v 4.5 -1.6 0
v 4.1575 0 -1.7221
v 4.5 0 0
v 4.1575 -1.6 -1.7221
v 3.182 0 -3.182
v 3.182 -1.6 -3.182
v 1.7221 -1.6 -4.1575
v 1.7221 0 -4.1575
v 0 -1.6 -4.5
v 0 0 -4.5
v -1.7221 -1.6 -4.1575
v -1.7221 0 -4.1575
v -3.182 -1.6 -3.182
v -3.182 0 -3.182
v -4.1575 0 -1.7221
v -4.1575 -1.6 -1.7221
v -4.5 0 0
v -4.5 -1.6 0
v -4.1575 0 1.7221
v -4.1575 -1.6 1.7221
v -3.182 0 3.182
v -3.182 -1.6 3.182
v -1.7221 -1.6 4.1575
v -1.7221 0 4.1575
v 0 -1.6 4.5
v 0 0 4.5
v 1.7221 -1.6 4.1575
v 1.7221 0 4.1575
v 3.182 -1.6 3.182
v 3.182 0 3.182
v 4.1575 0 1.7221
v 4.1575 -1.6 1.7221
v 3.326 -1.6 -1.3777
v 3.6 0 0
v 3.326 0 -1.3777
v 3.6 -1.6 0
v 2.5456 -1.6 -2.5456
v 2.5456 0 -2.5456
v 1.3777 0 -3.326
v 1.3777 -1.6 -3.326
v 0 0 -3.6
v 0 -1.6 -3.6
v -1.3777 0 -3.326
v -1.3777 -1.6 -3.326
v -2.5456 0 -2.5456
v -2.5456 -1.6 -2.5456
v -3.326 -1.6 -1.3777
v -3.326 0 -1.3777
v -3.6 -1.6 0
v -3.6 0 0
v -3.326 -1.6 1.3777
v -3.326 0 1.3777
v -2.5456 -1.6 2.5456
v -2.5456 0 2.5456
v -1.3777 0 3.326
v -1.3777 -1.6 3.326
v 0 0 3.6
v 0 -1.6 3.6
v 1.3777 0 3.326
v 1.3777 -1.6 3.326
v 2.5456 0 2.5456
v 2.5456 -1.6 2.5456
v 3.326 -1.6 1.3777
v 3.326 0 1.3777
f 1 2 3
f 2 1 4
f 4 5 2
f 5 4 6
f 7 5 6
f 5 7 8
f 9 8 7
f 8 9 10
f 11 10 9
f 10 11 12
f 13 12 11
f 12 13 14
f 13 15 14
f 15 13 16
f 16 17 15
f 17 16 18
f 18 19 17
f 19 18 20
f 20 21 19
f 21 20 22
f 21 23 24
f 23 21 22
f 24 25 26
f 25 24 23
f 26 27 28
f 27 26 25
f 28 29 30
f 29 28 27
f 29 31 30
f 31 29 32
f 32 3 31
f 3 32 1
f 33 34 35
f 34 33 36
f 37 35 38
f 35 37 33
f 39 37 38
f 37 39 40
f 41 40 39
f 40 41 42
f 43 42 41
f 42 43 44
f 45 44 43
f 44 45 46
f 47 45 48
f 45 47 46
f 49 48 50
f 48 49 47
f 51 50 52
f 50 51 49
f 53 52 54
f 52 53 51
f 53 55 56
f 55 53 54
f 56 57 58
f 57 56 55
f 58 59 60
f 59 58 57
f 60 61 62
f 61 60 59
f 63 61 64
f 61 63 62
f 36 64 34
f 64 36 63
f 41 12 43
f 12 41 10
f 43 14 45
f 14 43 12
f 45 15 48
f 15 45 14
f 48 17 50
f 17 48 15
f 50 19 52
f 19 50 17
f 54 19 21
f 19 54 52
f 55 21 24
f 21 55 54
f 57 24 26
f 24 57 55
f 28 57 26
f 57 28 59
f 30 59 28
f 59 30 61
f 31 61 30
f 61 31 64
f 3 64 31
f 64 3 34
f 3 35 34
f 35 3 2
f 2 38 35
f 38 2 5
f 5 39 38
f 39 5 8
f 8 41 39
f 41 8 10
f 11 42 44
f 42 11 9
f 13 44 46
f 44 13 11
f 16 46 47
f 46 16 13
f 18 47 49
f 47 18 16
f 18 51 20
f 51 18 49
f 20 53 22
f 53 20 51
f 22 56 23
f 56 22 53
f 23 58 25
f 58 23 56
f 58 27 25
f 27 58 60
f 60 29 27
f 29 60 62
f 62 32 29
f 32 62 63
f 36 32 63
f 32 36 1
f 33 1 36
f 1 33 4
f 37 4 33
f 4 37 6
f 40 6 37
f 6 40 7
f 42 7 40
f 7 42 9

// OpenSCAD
// file: ../p/4-4edge.scad
use <../lib.scad>
function ldraw_lib__4_4edge() = [
// 0 Circle 1.0
// 0 Name: 4-4edge.dat
// 0 Author: James Jessiman
// 0 !LDRAW_ORG Primitive UPDATE 2017-01
// 0 !LICENSE Licensed under CC BY 4.0 : see CAreadme.txt
// 
// 0 BFC CERTIFY CCW
  [0,"BFC","CERTIFY"],
  [0,"BFC","CCW"],
// 
// 0 !HISTORY 1998-12-15 [PTadmin] Official Update 1998-10
// 0 !HISTORY 2005-12-28 [PTadmin] Official Update 2005-01
// 0 !HISTORY 2007-06-24 [PTadmin] Header formatted for Contributor Agreement
// 0 !HISTORY 2008-07-01 [PTadmin] Official Update 2008-01
// 0 !HISTORY 2017-01-15 [Steffen] BFCed
// 0 !HISTORY 2017-12-30 [PTadmin] Official Update 2017-01
// 
// 
// 2 24 1 0 0 0.9239 0 0.3827
  [2,24,1,0,0,0.9239,0,0.3827],
// 2 24 0.9239 0 0.3827 0.7071 0 0.7071
  [2,24,0.9239,0,0.3827,0.7071,0,0.7071],
// 2 24 0.7071 0 0.7071 0.3827 0 0.9239
  [2,24,0.7071,0,0.7071,0.3827,0,0.9239],
// 2 24 0.3827 0 0.9239 0 0 1
  [2,24,0.3827,0,0.9239,0,0,1],
// 2 24 0 0 1 -0.3827 0 0.9239
  [2,24,0,0,1,-0.3827,0,0.9239],
// 2 24 -0.3827 0 0.9239 -0.7071 0 0.7071
  [2,24,-0.3827,0,0.9239,-0.7071,0,0.7071],
// 2 24 -0.7071 0 0.7071 -0.9239 0 0.3827
  [2,24,-0.7071,0,0.7071,-0.9239,0,0.3827],
// 2 24 -0.9239 0 0.3827 -1 0 -0
  [2,24,-0.9239,0,0.3827,-1,0,-0],
// 2 24 -1 0 -0 -0.9239 0 -0.3827
  [2,24,-1,0,-0,-0.9239,0,-0.3827],
// 2 24 -0.9239 0 -0.3827 -0.7071 0 -0.7071
  [2,24,-0.9239,0,-0.3827,-0.7071,0,-0.7071],
// 2 24 -0.7071 0 -0.7071 -0.3827 0 -0.9239
  [2,24,-0.7071,0,-0.7071,-0.3827,0,-0.9239],
// 2 24 -0.3827 0 -0.9239 0 0 -1
  [2,24,-0.3827,0,-0.9239,0,0,-1],
// 2 24 0 0 -1 0.3827 0 -0.9239
  [2,24,0,0,-1,0.3827,0,-0.9239],
// 2 24 0.3827 0 -0.9239 0.7071 0 -0.7071
  [2,24,0.3827,0,-0.9239,0.7071,0,-0.7071],
// 2 24 0.7071 0 -0.7071 0.9239 0 -0.3827
  [2,24,0.7071,0,-0.7071,0.9239,0,-0.3827],
// 2 24 0.9239 0 -0.3827 1 0 0
  [2,24,0.9239,0,-0.3827,1,0,0],
];
module ldraw_lib__4_4edge(step=0, col=false, unit=2/5, alt=false, line=0.2, solid=!$preview)
    makepoly(ldraw_lib__4_4edge(), step=step, col=col, unit=unit, alt=alt, line=line, solid=solid);
ldraw_lib__4_4edge(line=0.2);
// file: ../p/4-4cyli.scad
use <../lib.scad>
function ldraw_lib__4_4cyli() = [
// 0 Cylinder 1.0
// 0 Name: 4-4cyli.dat
// 0 Author: James Jessiman
// 0 !LDRAW_ORG Primitive UPDATE 2005-01
// 0 !LICENSE Licensed under CC BY 4.0 : see CAreadme.txt
// 
// 0 BFC CERTIFY CCW
  [0,"BFC","CERTIFY"],
  [0,"BFC","CCW"],
// 
// 0 !HISTORY 1998-12-15 [PTadmin] Official Update 1998-10
// 0 !HISTORY 2002-03-23 [sbliss] Added BFC statement; merged headers from files in distributions LDraw 0.27 and Complete.
// 0 !HISTORY 2002-04-25 [PTadmin] Official Update 2002-02
// 0 !HISTORY 2004-12-14 [guyvivan] BFC CCW
// 0 !HISTORY 2005-12-28 [PTadmin] Official Update 2005-01
// 0 !HISTORY 2007-06-24 [PTadmin] Header formatted for Contributor Agreement
// 0 !HISTORY 2008-07-01 [PTadmin] Official Update 2008-01
// 
// 
// 4 16 1 1 0 0.9239 1 0.3827 0.9239 0 0.3827 1 0 0
  [4,16,1,1,0,0.9239,1,0.3827,0.9239,0,0.3827,1,0,0],
// 5 24 1 0 0 1 1 0 0.9239 0 0.3827 0.9239 0 -0.3827
  [5,24,1,0,0,1,1,0,0.9239,0,0.3827,0.9239,0,-0.3827],
// 4 16 0.9239 1 0.3827 0.7071 1 0.7071 0.7071 0 0.7071 0.9239 0 0.3827
  [4,16,0.9239,1,0.3827,0.7071,1,0.7071,0.7071,0,0.7071,0.9239,0,0.3827],
// 5 24 0.9239 0 0.3827 0.9239 1 0.3827 0.7071 0 0.7071 1 0 0
  [5,24,0.9239,0,0.3827,0.9239,1,0.3827,0.7071,0,0.7071,1,0,0],
// 4 16 0.7071 1 0.7071 0.3827 1 0.9239 0.3827 0 0.9239 0.7071 0 0.7071
  [4,16,0.7071,1,0.7071,0.3827,1,0.9239,0.3827,0,0.9239,0.7071,0,0.7071],
// 5 24 0.7071 0 0.7071 0.7071 1 0.7071 0.3827 0 0.9239 0.9239 0 0.3827
  [5,24,0.7071,0,0.7071,0.7071,1,0.7071,0.3827,0,0.9239,0.9239,0,0.3827],
// 4 16 0.3827 1 0.9239 0 1 1 0 0 1 0.3827 0 0.9239
  [4,16,0.3827,1,0.9239,0,1,1,0,0,1,0.3827,0,0.9239],
// 5 24 0.3827 0 0.9239 0.3827 1 0.9239 0 0 1 0.7071 0 0.7071
  [5,24,0.3827,0,0.9239,0.3827,1,0.9239,0,0,1,0.7071,0,0.7071],
// 4 16 0 1 1 -0.3827 1 0.9239 -0.3827 0 0.9239 0 0 1
  [4,16,0,1,1,-0.3827,1,0.9239,-0.3827,0,0.9239,0,0,1],
// 5 24 0 0 1 0 1 1 -0.3827 0 0.9239 0.3827 0 0.9239
  [5,24,0,0,1,0,1,1,-0.3827,0,0.9239,0.3827,0,0.9239],
// 4 16 -0.3827 1 0.9239 -0.7071 1 0.7071 -0.7071 0 0.7071 -0.3827 0 0.9239
  [4,16,-0.3827,1,0.9239,-0.7071,1,0.7071,-0.7071,0,0.7071,-0.3827,0,0.9239],
// 5 24 -0.3827 0 0.9239 -0.3827 1 0.9239 -0.7071 0 0.7071 0 0 1
  [5,24,-0.3827,0,0.9239,-0.3827,1,0.9239,-0.7071,0,0.7071,0,0,1],
// 4 16 -0.7071 1 0.7071 -0.9239 1 0.3827 -0.9239 0 0.3827 -0.7071 0 0.7071
  [4,16,-0.7071,1,0.7071,-0.9239,1,0.3827,-0.9239,0,0.3827,-0.7071,0,0.7071],
// 5 24 -0.7071 0 0.7071 -0.7071 1 0.7071 -0.9239 0 0.3827 -0.3827 0 0.9239
  [5,24,-0.7071,0,0.7071,-0.7071,1,0.7071,-0.9239,0,0.3827,-0.3827,0,0.9239],
// 4 16 -0.9239 1 0.3827 -1 1 0 -1 0 0 -0.9239 0 0.3827
  [4,16,-0.9239,1,0.3827,-1,1,0,-1,0,0,-0.9239,0,0.3827],
// 5 24 -0.9239 0 0.3827 -0.9239 1 0.3827 -1 0 0 -0.7071 0 0.7071
  [5,24,-0.9239,0,0.3827,-0.9239,1,0.3827,-1,0,0,-0.7071,0,0.7071],
// 4 16 -1 1 0 -0.9239 1 -0.3827 -0.9239 0 -0.3827 -1 0 0
  [4,16,-1,1,0,-0.9239,1,-0.3827,-0.9239,0,-0.3827,-1,0,0],
// 5 24 -1 0 0 -1 1 0 -0.9239 0 -0.3827 -0.9239 0 0.3827
  [5,24,-1,0,0,-1,1,0,-0.9239,0,-0.3827,-0.9239,0,0.3827],
// 4 16 -0.9239 1 -0.3827 -0.7071 1 -0.7071 -0.7071 0 -0.7071 -0.9239 0 -0.3827
  [4,16,-0.9239,1,-0.3827,-0.7071,1,-0.7071,-0.7071,0,-0.7071,-0.9239,0,-0.3827],
// 5 24 -0.9239 0 -0.3827 -0.9239 1 -0.3827 -0.7071 0 -0.7071 -1 0 0
  [5,24,-0.9239,0,-0.3827,-0.9239,1,-0.3827,-0.7071,0,-0.7071,-1,0,0],
// 4 16 -0.7071 1 -0.7071 -0.3827 1 -0.9239 -0.3827 0 -0.9239 -0.7071 0 -0.7071
  [4,16,-0.7071,1,-0.7071,-0.3827,1,-0.9239,-0.3827,0,-0.9239,-0.7071,0,-0.7071],
// 5 24 -0.7071 0 -0.7071 -0.7071 1 -0.7071 -0.3827 0 -0.9239 -0.9239 0 -0.3827
  [5,24,-0.7071,0,-0.7071,-0.7071,1,-0.7071,-0.3827,0,-0.9239,-0.9239,0,-0.3827],
// 4 16 -0.3827 1 -0.9239 0 1 -1 0 0 -1 -0.3827 0 -0.9239
  [4,16,-0.3827,1,-0.9239,0,1,-1,0,0,-1,-0.3827,0,-0.9239],
// 5 24 -0.3827 0 -0.9239 -0.3827 1 -0.9239 0 0 -1 -0.7071 0 -0.7071
  [5,24,-0.3827,0,-0.9239,-0.3827,1,-0.9239,0,0,-1,-0.7071,0,-0.7071],
// 4 16 0 1 -1 0.3827 1 -0.9239 0.3827 0 -0.9239 0 0 -1
  [4,16,0,1,-1,0.3827,1,-0.9239,0.3827,0,-0.9239,0,0,-1],
// 5 24 0 0 -1 0 1 -1 0.3827 0 -0.9239 -0.3827 0 -0.9239
  [5,24,0,0,-1,0,1,-1,0.3827,0,-0.9239,-0.3827,0,-0.9239],
// 4 16 0.3827 1 -0.9239 0.7071 1 -0.7071 0.7071 0 -0.7071 0.3827 0 -0.9239
  [4,16,0.3827,1,-0.9239,0.7071,1,-0.7071,0.7071,0,-0.7071,0.3827,0,-0.9239],
// 5 24 0.3827 0 -0.9239 0.3827 1 -0.9239 0.7071 0 -0.7071 0 0 -1
  [5,24,0.3827,0,-0.9239,0.3827,1,-0.9239,0.7071,0,-0.7071,0,0,-1],
// 4 16 0.7071 1 -0.7071 0.9239 1 -0.3827 0.9239 0 -0.3827 0.7071 0 -0.7071
  [4,16,0.7071,1,-0.7071,0.9239,1,-0.3827,0.9239,0,-0.3827,0.7071,0,-0.7071],
// 5 24 0.7071 0 -0.7071 0.7071 1 -0.7071 0.9239 0 -0.3827 0.3827 0 -0.9239
  [5,24,0.7071,0,-0.7071,0.7071,1,-0.7071,0.9239,0,-0.3827,0.3827,0,-0.9239],
// 4 16 0.9239 1 -0.3827 1 1 0 1 0 0 0.9239 0 -0.3827
  [4,16,0.9239,1,-0.3827,1,1,0,1,0,0,0.9239,0,-0.3827],
// 5 24 0.9239 0 -0.3827 0.9239 1 -0.3827 1 0 0 0.7071 0 -0.7071
  [5,24,0.9239,0,-0.3827,0.9239,1,-0.3827,1,0,0,0.7071,0,-0.7071],
// 0
];
module ldraw_lib__4_4cyli(step=0, col=false, unit=2/5, alt=false, line=0.2, solid=!$preview)
    makepoly(ldraw_lib__4_4cyli(), step=step, col=col, unit=unit, alt=alt, line=line, solid=solid);
ldraw_lib__4_4cyli(line=0.2);
// file: ../p/4-4ring4.scad
use <../lib.scad>
function ldraw_lib__4_4ring4() = [
// 0 Ring  4 x 1.0
// 0 Name: 4-4ring4.dat
// 0 Author: James Jessiman
// 0 !LDRAW_ORG Primitive UPDATE 2009-01
// 0 !LICENSE Licensed under CC BY 4.0 : see CAreadme.txt
// 
// 0 BFC CERTIFY CCW
  [0,"BFC","CERTIFY"],
  [0,"BFC","CCW"],
// 
// 0 !HISTORY 1998-12-15 [PTadmin] Official Update 1998-10
// 0 !HISTORY 2002-04-08 [BrickCaster] Modified for BFC compliance
// 0 !HISTORY 2002-04-25 [PTadmin] Official Update 2002-02
// 0 !HISTORY 2007-06-24 [PTadmin] Header formatted for Contributor Agreement
// 0 !HISTORY 2008-07-01 [PTadmin] Official Update 2008-01
// 0 !HISTORY 2008-08-26 [cwdee] Switch polygon winding and rename
// 0 !HISTORY 2009-05-02 [PTadmin] Official Update 2009-01
// 
// 
// 4 16 -1.9135 0 4.6195 -1.5308 0 3.6956 0 0 4 0 0 5
  [4,16,-1.9135,0,4.6195,-1.5308,0,3.6956,0,0,4,0,0,5],
// 4 16 -3.5355 0 3.5355 -2.8284 0 2.8284 -1.5308 0 3.6956 -1.9135 0 4.6195
  [4,16,-3.5355,0,3.5355,-2.8284,0,2.8284,-1.5308,0,3.6956,-1.9135,0,4.6195],
// 4 16 -4.6195 0 1.9135 -3.6956 0 1.5308 -2.8284 0 2.8284 -3.5355 0 3.5355
  [4,16,-4.6195,0,1.9135,-3.6956,0,1.5308,-2.8284,0,2.8284,-3.5355,0,3.5355],
// 4 16 -5 0 0 -4 0 0 -3.6956 0 1.5308 -4.6195 0 1.9135
  [4,16,-5,0,0,-4,0,0,-3.6956,0,1.5308,-4.6195,0,1.9135],
// 4 16 -4.6195 0 -1.9135 -3.6956 0 -1.5308 -4 0 0 -5 0 0
  [4,16,-4.6195,0,-1.9135,-3.6956,0,-1.5308,-4,0,0,-5,0,0],
// 4 16 -3.5355 0 -3.5355 -2.8284 0 -2.8284 -3.6956 0 -1.5308 -4.6195 0 -1.9135
  [4,16,-3.5355,0,-3.5355,-2.8284,0,-2.8284,-3.6956,0,-1.5308,-4.6195,0,-1.9135],
// 4 16 -1.9135 0 -4.6195 -1.5308 0 -3.6956 -2.8284 0 -2.8284 -3.5355 0 -3.5355
  [4,16,-1.9135,0,-4.6195,-1.5308,0,-3.6956,-2.8284,0,-2.8284,-3.5355,0,-3.5355],
// 4 16 0 0 -5 0 0 -4 -1.5308 0 -3.6956 -1.9135 0 -4.6195
  [4,16,0,0,-5,0,0,-4,-1.5308,0,-3.6956,-1.9135,0,-4.6195],
// 4 16 1.9135 0 -4.6195 1.5308 0 -3.6956 0 0 -4 0 0 -5
  [4,16,1.9135,0,-4.6195,1.5308,0,-3.6956,0,0,-4,0,0,-5],
// 4 16 3.5355 0 -3.5355 2.8284 0 -2.8284 1.5308 0 -3.6956 1.9135 0 -4.6195
  [4,16,3.5355,0,-3.5355,2.8284,0,-2.8284,1.5308,0,-3.6956,1.9135,0,-4.6195],
// 4 16 4.6195 0 -1.9135 3.6956 0 -1.5308 2.8284 0 -2.8284 3.5355 0 -3.5355
  [4,16,4.6195,0,-1.9135,3.6956,0,-1.5308,2.8284,0,-2.8284,3.5355,0,-3.5355],
// 4 16 5 0 0 4 0 0 3.6956 0 -1.5308 4.6195 0 -1.9135
  [4,16,5,0,0,4,0,0,3.6956,0,-1.5308,4.6195,0,-1.9135],
// 4 16 4.6195 0 1.9135 3.6956 0 1.5308 4 0 0 5 0 0
  [4,16,4.6195,0,1.9135,3.6956,0,1.5308,4,0,0,5,0,0],
// 4 16 3.5355 0 3.5355 2.8284 0 2.8284 3.6956 0 1.5308 4.6195 0 1.9135
  [4,16,3.5355,0,3.5355,2.8284,0,2.8284,3.6956,0,1.5308,4.6195,0,1.9135],
// 4 16 1.9135 0 4.6195 1.5308 0 3.6956 2.8284 0 2.8284 3.5355 0 3.5355
  [4,16,1.9135,0,4.6195,1.5308,0,3.6956,2.8284,0,2.8284,3.5355,0,3.5355],
// 4 16 0 0 5 0 0 4 1.5308 0 3.6956 1.9135 0 4.6195
  [4,16,0,0,5,0,0,4,1.5308,0,3.6956,1.9135,0,4.6195],
// 0
];
module ldraw_lib__4_4ring4(step=0, col=false, unit=2/5, alt=false, line=0.2, solid=!$preview)
    makepoly(ldraw_lib__4_4ring4(), step=step, col=col, unit=unit, alt=alt, line=line, solid=solid);
ldraw_lib__4_4ring4(line=0.2);
// file: ../p/4-4cylo.scad
use <../lib.scad>
use <4-4cyli.scad>
use <4-4edge.scad>
function ldraw_lib__4_4cylo() = [
// 0 Cylinder Open 1.0
// 0 Name: 4-4cylo.dat
// 0 Author: Mark Kennedy [mkennedy]
// 0 !LDRAW_ORG Primitive UPDATE 2010-01
// 0 !LICENSE Licensed under CC BY 4.0 : see CAreadme.txt
// 
// 0 BFC CERTIFY CCW
  [0,"BFC","CERTIFY"],
  [0,"BFC","CCW"],
// 
// 0 !HISTORY 2010-04-05 [PTadmin] Official Update 2010-01
// 
// 
// 1 16 0 0 0 1 0 0 0 1 0 0 0 1 4-4edge.dat
  [1,16,0,0,0,1,0,0,0,1,0,0,0,1, ldraw_lib__4_4edge()],
// 1 16 0 1 0 1 0 0 0 1 0 0 0 1 4-4edge.dat
  [1,16,0,1,0,1,0,0,0,1,0,0,0,1, ldraw_lib__4_4edge()],
// 1 16 0 0 0 1 0 0 0 1 0 0 0 1 4-4cyli.dat
  [1,16,0,0,0,1,0,0,0,1,0,0,0,1, ldraw_lib__4_4cyli()],
// 0
];
module ldraw_lib__4_4cylo(step=0, col=false, unit=2/5, alt=false, line=0.2, solid=!$preview)
    makepoly(ldraw_lib__4_4cylo(), step=step, col=col, unit=unit, alt=alt, line=line, solid=solid);
ldraw_lib__4_4cylo(line=0.2);
// main file
use <../lib.scad>
use <../p/4-4cylo.scad>
use <../p/4-4ring4.scad>
function ldraw_lib__t1193() = [
// 0 ~| BuWizz Electric Motor Bearing
// 0 Name: t1193.dat
// 0 Author: Philippe Hurbain [Philo]
// 0 !LDRAW_ORG Part UPDATE 2025-02
// 0 !LICENSE Licensed under CC BY 4.0 : see CAreadme.txt
// 
// 0 BFC CERTIFY CCW
  [0,"BFC","CERTIFY"],
  [0,"BFC","CCW"],
// 
// 0 !CATEGORY Electric
// 
// 0 !HISTORY 2025-02-27 [OrionP] Official Update 2025-02
// 
// 
// 1 16 0 0 0 11.25 0 0 0 0 11.25 0 -4 0 4-4cylo.dat
  [1,16,0,0,0,11.25,0,0,0,0,11.25,0,-4,0, ldraw_lib__4_4cylo()],
// 0 BFC INVERTNEXT
  [0,"BFC","INVERTNEXT"],
// 1 16 0 0 0 9 0 0 0 0 9 0 -4 0 4-4cylo.dat
  [1,16,0,0,0,9,0,0,0,0,9,0,-4,0, ldraw_lib__4_4cylo()],
// 1 16 0 0 0 2.25 0 0 0 0 2.25 0 -4 0 4-4ring4.dat
  [1,16,0,0,0,2.25,0,0,0,0,2.25,0,-4,0, ldraw_lib__4_4ring4()],
// 1 16 0 0 -4 2.25 0 0 0 0 2.25 0 4 0 4-4ring4.dat
  [1,16,0,0,-4,2.25,0,0,0,0,2.25,0,4,0, ldraw_lib__4_4ring4()],
];
module ldraw_lib__t1193(step=0, col=false, unit=2/5, alt=false, line=0.2, solid=!$preview)
    makepoly(ldraw_lib__t1193(), step=step, col=col, unit=unit, alt=alt, line=line, solid=solid);
ldraw_lib__t1193(line=0.2);
